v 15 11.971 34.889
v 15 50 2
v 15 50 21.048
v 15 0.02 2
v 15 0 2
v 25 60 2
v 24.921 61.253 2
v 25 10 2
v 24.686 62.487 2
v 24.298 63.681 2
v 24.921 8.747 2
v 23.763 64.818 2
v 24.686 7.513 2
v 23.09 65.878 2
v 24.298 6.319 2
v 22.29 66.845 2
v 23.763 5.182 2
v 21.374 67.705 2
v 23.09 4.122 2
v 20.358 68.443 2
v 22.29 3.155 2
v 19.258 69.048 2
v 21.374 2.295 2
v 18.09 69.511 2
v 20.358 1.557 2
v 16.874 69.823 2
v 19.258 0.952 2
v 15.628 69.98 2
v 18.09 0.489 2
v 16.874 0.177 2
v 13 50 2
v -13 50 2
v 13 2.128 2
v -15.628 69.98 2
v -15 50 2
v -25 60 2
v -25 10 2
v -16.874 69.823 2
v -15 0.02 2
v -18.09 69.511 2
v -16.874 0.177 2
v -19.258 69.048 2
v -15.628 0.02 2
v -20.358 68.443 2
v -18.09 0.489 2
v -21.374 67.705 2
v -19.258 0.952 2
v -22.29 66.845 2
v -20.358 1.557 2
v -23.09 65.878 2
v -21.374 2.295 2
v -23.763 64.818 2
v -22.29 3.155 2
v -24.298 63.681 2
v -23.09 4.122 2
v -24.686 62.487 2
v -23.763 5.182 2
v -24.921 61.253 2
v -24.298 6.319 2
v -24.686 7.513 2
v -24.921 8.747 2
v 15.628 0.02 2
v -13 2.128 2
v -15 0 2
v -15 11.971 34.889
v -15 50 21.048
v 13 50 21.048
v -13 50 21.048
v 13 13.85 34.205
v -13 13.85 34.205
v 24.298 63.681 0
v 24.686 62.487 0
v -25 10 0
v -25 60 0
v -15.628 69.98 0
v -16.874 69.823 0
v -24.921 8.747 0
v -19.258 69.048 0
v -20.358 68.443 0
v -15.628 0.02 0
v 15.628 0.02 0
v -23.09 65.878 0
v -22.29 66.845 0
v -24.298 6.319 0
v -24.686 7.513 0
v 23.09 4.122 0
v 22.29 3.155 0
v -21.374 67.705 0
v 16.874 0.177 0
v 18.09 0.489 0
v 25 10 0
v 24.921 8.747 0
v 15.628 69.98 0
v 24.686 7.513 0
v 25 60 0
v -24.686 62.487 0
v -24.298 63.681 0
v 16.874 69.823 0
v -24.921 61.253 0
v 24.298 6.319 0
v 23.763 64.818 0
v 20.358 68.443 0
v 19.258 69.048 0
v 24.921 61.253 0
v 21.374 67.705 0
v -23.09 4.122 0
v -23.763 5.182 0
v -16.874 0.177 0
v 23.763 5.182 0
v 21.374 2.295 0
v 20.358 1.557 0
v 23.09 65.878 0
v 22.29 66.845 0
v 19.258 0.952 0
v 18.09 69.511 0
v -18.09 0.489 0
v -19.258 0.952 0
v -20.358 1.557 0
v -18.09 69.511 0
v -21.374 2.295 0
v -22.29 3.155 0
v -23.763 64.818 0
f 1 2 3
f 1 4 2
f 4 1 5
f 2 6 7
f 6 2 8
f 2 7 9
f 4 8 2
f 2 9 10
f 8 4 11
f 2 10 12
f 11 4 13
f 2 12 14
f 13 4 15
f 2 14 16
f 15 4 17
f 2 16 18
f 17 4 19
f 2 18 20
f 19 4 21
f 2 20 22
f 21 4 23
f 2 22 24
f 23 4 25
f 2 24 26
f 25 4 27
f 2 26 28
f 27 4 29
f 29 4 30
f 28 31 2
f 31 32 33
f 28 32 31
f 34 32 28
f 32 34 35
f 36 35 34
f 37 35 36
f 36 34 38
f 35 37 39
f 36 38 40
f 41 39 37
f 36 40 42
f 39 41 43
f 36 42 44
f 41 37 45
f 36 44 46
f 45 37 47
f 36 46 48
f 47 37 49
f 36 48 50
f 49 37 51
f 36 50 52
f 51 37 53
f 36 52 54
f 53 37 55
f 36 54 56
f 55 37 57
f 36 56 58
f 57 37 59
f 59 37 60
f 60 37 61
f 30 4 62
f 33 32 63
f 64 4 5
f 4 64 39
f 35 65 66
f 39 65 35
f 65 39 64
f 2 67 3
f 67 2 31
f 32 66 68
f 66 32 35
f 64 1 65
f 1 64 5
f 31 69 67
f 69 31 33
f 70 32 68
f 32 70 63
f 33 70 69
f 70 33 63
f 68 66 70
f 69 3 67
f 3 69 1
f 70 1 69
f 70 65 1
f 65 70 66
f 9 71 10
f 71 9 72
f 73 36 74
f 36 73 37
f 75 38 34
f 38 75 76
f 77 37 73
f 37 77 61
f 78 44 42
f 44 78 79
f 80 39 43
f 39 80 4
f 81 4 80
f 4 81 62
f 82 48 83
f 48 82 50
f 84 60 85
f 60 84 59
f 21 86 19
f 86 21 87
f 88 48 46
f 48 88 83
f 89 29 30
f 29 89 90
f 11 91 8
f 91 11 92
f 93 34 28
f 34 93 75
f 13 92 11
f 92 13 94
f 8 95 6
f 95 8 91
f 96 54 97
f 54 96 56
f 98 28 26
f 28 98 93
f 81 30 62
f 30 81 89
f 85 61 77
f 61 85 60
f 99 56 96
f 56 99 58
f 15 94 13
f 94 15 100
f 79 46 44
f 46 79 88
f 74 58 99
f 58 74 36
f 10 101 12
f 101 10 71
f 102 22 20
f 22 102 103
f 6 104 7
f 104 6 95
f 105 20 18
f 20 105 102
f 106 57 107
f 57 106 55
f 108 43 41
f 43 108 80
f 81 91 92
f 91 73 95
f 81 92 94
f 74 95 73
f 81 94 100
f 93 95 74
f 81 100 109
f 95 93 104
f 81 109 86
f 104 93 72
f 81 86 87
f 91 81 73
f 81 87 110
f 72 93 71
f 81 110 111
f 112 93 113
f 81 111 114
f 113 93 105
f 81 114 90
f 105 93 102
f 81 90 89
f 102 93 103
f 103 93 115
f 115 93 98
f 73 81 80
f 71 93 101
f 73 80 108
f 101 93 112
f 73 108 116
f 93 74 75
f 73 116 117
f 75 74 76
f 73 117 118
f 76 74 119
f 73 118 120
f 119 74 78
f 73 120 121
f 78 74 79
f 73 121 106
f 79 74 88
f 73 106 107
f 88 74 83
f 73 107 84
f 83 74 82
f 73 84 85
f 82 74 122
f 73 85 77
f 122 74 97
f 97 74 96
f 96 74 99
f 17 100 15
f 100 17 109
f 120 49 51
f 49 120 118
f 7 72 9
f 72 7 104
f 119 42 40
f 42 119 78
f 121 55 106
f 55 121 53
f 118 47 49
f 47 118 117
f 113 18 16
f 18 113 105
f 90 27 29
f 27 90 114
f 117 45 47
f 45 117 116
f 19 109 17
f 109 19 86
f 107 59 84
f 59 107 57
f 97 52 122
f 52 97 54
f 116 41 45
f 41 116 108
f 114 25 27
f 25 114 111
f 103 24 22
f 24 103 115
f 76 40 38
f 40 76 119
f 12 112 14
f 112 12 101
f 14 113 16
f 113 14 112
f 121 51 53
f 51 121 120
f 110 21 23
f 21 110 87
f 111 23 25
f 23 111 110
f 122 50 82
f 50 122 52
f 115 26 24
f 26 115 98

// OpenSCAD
// file: plate.scad
plate_height = 70;
plate_width = 50;
plate_radius = 10;
plate_thickness = 2;

module plate() {
	translate([plate_radius-plate_width/2, plate_radius, 0]) minkowski() {
		cube([plate_width-plate_radius*2, plate_height-plate_radius*2, plate_thickness/2]);
		cylinder(r=plate_radius, h=plate_thickness/2, $fn=50);
	}
}

//plate();
// main file
//terrain: asphalt, concrete, stone

include<plate.scad>;


plate_angle = 70;

module easel() {
	difference() {
		cube([plate_width-plate_radius*2, 50, 35]);
		rotate([-90+plate_angle, 0, 0]) translate([0, -40, 0]) cube([plate_width-plate_radius*2, 40, 60]);
		rotate([-90+plate_angle, 0, 0]) translate([2, 2, 0]) cube([plate_width-plate_radius*2-4, 50, 50]);
		rotate([-90+plate_angle, 0, 0]) translate([0, -0.5, 35]) cube([plate_width-plate_radius*2, 50, 50]);
	}
}
translate([(plate_width-plate_radius*2)/-2, 0, plate_thickness]) easel();
plate();
